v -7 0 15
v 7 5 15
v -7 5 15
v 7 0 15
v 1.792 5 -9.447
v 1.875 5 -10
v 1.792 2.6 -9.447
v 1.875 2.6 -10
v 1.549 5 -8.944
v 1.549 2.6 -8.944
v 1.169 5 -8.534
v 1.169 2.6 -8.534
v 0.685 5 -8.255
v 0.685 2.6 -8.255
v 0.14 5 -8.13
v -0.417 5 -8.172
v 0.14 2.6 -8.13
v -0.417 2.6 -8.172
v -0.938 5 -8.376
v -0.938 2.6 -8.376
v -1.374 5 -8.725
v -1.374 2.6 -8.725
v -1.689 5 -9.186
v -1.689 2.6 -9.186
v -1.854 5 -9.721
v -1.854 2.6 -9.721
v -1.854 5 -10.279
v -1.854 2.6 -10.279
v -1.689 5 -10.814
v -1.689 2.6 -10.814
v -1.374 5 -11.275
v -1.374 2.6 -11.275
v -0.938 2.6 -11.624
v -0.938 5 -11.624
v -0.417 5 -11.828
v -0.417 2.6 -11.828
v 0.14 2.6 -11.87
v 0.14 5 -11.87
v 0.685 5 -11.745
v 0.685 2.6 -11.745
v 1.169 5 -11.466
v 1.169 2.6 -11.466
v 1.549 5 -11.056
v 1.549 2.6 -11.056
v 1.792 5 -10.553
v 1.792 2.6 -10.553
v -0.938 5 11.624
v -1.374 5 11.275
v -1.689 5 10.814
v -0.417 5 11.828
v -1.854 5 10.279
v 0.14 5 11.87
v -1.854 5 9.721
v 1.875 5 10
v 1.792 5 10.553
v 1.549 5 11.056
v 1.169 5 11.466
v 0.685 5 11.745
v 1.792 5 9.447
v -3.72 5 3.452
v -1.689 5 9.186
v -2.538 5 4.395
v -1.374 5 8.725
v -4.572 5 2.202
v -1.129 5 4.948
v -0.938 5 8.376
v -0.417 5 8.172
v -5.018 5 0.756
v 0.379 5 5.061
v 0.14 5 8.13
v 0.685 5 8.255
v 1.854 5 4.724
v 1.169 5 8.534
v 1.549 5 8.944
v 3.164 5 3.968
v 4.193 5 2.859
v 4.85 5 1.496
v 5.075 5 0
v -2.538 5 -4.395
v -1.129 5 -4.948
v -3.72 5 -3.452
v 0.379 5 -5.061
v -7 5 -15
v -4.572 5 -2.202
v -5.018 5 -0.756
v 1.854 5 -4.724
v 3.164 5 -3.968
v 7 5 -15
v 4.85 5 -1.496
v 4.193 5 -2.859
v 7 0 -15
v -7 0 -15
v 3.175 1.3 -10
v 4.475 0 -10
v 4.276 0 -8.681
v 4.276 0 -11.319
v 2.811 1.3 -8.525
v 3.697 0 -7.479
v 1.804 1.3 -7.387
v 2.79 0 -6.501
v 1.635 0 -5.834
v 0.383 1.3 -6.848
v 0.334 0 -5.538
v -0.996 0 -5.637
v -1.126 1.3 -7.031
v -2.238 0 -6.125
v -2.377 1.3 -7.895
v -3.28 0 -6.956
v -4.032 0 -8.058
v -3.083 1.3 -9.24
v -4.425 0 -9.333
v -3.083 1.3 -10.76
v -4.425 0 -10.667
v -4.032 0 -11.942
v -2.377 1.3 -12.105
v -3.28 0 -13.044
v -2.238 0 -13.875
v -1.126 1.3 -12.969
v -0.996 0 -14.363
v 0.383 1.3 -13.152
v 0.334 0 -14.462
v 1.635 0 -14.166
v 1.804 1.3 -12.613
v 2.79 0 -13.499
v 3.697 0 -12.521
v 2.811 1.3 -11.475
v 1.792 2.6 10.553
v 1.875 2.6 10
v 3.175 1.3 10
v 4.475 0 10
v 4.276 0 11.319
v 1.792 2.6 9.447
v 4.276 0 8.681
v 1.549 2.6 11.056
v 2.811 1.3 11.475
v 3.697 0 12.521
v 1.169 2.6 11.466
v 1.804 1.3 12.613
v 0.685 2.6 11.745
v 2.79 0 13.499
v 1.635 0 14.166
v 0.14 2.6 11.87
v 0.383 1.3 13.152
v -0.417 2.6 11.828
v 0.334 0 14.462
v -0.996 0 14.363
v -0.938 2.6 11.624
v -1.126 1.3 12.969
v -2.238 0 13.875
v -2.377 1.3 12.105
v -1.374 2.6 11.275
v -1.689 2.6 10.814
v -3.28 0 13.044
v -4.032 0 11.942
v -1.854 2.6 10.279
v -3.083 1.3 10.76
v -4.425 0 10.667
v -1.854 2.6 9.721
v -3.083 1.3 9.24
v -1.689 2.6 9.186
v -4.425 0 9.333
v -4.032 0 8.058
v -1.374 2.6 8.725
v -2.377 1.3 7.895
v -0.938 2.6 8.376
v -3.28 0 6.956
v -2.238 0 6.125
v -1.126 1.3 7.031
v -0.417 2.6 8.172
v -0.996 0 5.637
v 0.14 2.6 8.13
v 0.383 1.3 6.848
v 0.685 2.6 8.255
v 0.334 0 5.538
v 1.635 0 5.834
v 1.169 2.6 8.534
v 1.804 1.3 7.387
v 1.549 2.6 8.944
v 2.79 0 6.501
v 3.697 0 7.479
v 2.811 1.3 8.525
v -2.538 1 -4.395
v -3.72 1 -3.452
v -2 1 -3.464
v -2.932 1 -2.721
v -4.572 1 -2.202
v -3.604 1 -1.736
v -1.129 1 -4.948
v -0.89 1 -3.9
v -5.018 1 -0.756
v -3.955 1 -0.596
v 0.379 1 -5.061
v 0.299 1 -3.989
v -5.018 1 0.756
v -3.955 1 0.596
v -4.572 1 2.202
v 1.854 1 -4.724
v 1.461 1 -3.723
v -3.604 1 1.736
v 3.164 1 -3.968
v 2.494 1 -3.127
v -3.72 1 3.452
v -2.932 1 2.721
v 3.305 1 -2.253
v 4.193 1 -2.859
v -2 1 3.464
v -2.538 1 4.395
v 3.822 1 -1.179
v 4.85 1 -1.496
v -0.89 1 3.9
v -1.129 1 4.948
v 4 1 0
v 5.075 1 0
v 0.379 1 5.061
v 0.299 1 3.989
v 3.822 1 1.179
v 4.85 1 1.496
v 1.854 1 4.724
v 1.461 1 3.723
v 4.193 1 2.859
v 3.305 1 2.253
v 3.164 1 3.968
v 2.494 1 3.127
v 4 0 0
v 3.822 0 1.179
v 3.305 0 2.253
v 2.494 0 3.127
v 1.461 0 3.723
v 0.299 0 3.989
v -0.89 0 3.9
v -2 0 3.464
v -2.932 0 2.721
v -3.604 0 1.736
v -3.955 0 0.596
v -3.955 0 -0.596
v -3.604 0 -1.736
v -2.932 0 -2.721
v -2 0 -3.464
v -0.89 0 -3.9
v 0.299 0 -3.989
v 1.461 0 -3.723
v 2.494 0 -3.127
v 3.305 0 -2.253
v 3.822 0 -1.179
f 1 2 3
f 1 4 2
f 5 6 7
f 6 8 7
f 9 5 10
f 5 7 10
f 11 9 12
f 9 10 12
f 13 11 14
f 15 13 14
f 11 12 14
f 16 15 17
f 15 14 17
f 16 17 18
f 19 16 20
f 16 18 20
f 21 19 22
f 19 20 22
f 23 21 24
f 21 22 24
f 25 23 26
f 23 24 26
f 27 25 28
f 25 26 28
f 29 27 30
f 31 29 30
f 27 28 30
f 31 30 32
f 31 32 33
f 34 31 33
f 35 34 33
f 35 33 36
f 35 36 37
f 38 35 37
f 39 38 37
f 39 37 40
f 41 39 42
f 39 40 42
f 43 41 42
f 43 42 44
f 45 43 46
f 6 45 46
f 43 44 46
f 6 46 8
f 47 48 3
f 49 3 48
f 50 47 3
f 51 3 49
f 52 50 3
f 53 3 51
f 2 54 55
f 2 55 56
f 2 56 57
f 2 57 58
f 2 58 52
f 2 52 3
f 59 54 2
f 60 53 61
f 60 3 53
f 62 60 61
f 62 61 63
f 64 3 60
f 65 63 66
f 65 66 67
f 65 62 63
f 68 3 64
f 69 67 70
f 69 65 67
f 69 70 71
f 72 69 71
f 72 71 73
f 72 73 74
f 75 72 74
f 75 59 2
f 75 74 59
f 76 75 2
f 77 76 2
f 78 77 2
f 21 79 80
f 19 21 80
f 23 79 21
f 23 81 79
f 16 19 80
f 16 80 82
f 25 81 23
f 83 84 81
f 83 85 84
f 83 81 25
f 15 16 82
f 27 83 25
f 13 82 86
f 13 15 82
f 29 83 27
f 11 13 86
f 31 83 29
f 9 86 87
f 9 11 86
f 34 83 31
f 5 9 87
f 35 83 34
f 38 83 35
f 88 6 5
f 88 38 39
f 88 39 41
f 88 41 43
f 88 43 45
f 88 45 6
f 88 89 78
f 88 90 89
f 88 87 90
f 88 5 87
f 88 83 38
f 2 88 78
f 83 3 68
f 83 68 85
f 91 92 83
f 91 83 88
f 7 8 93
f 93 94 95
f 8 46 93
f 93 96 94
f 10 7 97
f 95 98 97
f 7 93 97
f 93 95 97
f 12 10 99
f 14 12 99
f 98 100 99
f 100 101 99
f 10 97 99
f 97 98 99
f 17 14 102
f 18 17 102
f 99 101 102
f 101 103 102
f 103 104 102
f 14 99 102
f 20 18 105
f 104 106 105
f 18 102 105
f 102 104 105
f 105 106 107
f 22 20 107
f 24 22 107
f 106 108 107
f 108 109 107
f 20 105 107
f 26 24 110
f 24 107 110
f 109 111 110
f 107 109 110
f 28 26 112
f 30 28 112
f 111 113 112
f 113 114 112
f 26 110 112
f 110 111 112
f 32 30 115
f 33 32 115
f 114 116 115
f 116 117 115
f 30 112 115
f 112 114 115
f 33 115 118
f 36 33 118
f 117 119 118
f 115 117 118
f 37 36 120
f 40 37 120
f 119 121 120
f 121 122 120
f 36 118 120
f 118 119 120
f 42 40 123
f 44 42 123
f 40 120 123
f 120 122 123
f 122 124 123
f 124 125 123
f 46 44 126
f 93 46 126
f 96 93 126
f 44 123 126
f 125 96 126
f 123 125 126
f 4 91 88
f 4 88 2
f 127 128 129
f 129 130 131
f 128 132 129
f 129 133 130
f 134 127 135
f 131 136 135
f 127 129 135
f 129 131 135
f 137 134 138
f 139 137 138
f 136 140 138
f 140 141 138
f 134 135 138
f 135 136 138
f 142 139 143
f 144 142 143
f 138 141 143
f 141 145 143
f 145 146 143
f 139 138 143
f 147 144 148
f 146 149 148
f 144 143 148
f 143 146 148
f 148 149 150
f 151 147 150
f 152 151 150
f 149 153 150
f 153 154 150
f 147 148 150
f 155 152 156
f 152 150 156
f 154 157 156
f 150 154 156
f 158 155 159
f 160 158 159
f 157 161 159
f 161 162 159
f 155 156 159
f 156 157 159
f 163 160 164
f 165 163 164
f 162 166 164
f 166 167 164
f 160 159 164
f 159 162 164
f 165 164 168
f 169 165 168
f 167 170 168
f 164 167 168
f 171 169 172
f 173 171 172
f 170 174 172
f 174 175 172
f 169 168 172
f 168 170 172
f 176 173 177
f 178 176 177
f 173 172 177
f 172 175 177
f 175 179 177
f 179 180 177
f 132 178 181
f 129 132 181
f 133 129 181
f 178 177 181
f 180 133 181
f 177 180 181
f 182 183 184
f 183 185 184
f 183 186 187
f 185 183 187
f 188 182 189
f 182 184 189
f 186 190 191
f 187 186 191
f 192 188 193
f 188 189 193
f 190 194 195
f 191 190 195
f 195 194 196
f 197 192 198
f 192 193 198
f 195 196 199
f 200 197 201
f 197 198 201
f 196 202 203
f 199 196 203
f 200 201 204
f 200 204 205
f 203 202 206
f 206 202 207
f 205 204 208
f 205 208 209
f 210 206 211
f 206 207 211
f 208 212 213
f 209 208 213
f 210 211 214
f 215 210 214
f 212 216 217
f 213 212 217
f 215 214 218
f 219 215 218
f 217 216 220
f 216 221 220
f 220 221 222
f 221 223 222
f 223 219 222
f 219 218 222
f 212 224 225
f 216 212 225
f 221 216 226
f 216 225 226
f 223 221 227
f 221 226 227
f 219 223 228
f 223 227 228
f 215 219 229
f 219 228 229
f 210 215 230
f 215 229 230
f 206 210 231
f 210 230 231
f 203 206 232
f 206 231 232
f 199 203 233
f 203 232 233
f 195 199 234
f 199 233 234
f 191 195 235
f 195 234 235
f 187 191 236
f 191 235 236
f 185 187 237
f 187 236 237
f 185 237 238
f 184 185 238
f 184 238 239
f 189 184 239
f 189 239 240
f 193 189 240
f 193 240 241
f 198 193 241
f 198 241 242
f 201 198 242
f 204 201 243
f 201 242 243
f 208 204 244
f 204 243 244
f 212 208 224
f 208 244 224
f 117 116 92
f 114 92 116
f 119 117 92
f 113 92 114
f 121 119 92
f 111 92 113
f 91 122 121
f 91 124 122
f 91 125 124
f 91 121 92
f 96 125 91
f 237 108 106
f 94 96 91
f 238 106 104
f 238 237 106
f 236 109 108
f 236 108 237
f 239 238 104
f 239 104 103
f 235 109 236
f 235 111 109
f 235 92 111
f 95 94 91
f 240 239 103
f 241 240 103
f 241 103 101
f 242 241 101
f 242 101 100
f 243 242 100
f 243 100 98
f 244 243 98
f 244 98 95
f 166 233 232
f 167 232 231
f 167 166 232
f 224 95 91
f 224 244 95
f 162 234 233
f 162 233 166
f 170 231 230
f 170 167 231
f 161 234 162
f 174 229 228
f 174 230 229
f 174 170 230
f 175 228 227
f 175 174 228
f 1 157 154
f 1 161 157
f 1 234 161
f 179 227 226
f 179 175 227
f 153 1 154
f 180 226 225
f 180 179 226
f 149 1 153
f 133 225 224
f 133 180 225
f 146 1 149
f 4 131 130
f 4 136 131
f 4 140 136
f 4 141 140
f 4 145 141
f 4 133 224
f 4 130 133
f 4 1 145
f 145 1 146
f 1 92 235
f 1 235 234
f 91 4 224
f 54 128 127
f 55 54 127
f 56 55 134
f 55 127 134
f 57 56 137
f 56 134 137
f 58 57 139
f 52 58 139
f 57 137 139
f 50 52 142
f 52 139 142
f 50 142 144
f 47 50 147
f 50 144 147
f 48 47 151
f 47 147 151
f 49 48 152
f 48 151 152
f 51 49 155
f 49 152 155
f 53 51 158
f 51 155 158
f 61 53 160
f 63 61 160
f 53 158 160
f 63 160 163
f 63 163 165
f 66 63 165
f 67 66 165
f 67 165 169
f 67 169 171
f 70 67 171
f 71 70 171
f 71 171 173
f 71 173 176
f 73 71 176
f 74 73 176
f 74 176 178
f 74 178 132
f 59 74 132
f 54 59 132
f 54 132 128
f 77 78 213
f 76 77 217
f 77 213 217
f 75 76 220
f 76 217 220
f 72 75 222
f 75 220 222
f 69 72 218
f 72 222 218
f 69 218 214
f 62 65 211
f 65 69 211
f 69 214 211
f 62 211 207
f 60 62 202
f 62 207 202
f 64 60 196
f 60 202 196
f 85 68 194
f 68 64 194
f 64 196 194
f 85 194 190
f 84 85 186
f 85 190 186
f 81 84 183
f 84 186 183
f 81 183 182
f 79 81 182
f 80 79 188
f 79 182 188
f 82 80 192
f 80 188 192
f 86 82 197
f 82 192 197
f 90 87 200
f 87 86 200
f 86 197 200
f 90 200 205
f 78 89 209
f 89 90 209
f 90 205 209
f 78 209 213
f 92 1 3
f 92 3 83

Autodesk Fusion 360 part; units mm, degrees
sketch "Sketch1" plane through (0, 0, 0) normal (0, 1, 0) x (1, 0, 0)
  circle A0 centre (0, 0) radius 5.075
  line L0 (-7, 15) -> (7, 15)
  line L1 (7, 15) -> (7, -15)
  line L2 (7, -15) -> (-7, -15)
  line L3 (-7, -15) -> (-7, 15)
  line L4 (-7, 15) -> (7, -15) construction
  line L5 (7, 15) -> (-7, -15) construction
  dimension "d1" = 10.15
  dimension "d2" = 7
  dimension "d3" = 30
extrude "Extrude1" add sketch "Sketch1" along normal blind 5
sketch "Sketch2" plane through (0, 0, 0) normal (0, -1, 0) x (1, 0, 0)
  circle A0 centre (0, 0) radius 5.075
  line L0 (7, 15) -> (-7, 15)
  line L1 (-7, 15) -> (-7, -15)
  line L2 (-7, -15) -> (7, -15)
  line L3 (7, -15) -> (7, 15)
  line L4 (0, 15) -> (0, -15) construction
  line L5 (0, 0) -> (33.31, 0) construction
  circle A1 centre (0, 10) radius 1.875
  circle A2 centre (0, -10) radius 1.875
  dimension "d6" = 3.75
extrude "Extrude2" cut sketch "Sketch2" against normal blind 31 contours A1 | A2
chamfer "Chamfer1" distance 2.6 angle 45 2 edges at (-1.7481, 0, 10.678) (-1.7481, 0, -9.322)
sketch "Sketch3" plane through (0, 0, 0) normal (0, -1, 0) x (1, 0, 0)
  line L0 (7, -15) -> (7, 15)
  line L1 (7, 15) -> (-7, 15)
  line L2 (-7, 15) -> (-7, -15)
  line L3 (-7, -15) -> (7, -15)
  circle A0 centre (0, 0) radius 5.075
  circle A1 centre (0, 0) radius 4
  circle A2 centre (0, 0) radius 5.075
  circle A3 centre (0, 10) radius 4.475
  circle A4 centre (0, -10) radius 4.475
  dimension "d10" = 8
extrude "Extrude3" add sketch "Sketch3" against normal blind 1 contours A0 A2
